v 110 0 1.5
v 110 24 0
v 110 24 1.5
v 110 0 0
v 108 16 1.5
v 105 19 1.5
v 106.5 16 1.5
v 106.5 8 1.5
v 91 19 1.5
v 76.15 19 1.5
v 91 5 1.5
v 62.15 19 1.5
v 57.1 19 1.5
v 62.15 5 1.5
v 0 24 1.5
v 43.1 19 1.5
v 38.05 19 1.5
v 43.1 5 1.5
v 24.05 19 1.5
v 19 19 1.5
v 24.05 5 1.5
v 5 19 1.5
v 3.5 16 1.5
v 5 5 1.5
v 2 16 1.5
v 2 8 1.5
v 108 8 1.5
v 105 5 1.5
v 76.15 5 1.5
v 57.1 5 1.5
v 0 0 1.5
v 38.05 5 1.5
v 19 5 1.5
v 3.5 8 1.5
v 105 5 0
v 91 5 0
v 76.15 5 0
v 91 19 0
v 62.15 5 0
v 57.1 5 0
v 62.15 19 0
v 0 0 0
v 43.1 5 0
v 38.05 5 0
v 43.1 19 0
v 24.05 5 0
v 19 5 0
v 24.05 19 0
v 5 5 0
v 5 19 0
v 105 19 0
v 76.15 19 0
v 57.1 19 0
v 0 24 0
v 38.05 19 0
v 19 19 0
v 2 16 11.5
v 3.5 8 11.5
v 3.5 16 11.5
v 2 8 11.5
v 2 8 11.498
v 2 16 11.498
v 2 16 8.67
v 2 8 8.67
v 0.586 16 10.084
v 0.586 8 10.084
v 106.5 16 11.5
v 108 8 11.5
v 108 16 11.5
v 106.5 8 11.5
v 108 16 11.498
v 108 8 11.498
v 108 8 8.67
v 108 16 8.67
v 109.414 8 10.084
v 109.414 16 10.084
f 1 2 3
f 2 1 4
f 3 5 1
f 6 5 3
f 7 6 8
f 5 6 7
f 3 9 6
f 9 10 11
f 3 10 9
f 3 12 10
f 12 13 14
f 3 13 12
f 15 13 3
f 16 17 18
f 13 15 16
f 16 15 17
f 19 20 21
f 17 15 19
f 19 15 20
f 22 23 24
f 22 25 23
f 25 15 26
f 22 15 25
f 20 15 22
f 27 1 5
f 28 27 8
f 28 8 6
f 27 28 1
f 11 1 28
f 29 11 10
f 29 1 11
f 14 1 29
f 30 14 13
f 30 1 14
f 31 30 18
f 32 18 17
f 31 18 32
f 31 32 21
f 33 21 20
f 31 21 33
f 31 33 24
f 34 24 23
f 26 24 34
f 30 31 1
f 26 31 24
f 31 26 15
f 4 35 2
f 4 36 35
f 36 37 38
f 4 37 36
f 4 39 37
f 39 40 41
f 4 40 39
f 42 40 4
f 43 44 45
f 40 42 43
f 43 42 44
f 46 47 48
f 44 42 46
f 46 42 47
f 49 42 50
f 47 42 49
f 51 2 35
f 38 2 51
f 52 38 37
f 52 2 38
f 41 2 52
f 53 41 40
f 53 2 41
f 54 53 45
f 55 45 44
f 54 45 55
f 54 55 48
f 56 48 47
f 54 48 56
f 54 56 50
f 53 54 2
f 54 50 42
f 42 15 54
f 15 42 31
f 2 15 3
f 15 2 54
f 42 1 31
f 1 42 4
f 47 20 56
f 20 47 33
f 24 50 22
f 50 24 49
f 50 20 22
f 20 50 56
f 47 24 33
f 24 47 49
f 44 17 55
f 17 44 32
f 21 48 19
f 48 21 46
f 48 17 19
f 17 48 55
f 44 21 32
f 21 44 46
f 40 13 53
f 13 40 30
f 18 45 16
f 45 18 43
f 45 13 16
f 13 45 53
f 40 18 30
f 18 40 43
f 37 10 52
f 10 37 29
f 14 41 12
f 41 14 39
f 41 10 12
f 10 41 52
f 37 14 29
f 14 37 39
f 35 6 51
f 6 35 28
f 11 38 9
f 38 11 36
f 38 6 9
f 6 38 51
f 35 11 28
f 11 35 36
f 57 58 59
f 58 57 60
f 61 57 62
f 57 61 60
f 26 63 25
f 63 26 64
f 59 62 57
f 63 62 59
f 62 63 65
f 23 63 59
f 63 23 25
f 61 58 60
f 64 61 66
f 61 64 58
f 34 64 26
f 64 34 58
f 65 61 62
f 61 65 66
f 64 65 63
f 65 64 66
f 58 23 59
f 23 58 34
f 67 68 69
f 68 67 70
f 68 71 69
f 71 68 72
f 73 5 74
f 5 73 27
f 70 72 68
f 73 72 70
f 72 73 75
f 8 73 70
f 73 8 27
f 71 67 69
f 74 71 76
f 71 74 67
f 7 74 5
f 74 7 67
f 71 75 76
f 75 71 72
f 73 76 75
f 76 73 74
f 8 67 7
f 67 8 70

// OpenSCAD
$width = 110;
$plate_height = 24;

// plate
union() {
    difference() {
        cube([$width, $plate_height, 1.5]);

        translate([5, 5, -0.5])
            cube([14, 14, 2.5]);
        translate([24.05, 5, -0.5])
            cube([14, 14, 2.5]);
        translate([43.10, 5, -0.5])
            cube([14, 14, 2.5]);
        translate([62.15, 5, -0.5])
            cube([14, 14, 2.5]);
        translate([$width - 19, 5, -0.5])
            cube([14, 14, 2.5]);
    }

    difference() {
        union() {
            translate([2, 8, 1.5])
            cube([2, 8, 10]);

            translate([2, 8, 8.67])
            rotate([0,-45,0])
            cube([2, 8, 2]);
        }
        translate([3.5, 7, 1.5])
        cube([2, 10, 12]);
    }
    
    translate([$width, 24, 0])
    rotate([0,0,180])
    difference() {
        union() {
            translate([2, 8, 1.5])
            cube([2, 8, 10]);

            translate([2, 8, 8.67])
            rotate([0,-45,0])
            cube([2, 8, 2]);
        }
        translate([3.5, 7, 1.5])
        cube([2, 10, 12]);
    }
}
